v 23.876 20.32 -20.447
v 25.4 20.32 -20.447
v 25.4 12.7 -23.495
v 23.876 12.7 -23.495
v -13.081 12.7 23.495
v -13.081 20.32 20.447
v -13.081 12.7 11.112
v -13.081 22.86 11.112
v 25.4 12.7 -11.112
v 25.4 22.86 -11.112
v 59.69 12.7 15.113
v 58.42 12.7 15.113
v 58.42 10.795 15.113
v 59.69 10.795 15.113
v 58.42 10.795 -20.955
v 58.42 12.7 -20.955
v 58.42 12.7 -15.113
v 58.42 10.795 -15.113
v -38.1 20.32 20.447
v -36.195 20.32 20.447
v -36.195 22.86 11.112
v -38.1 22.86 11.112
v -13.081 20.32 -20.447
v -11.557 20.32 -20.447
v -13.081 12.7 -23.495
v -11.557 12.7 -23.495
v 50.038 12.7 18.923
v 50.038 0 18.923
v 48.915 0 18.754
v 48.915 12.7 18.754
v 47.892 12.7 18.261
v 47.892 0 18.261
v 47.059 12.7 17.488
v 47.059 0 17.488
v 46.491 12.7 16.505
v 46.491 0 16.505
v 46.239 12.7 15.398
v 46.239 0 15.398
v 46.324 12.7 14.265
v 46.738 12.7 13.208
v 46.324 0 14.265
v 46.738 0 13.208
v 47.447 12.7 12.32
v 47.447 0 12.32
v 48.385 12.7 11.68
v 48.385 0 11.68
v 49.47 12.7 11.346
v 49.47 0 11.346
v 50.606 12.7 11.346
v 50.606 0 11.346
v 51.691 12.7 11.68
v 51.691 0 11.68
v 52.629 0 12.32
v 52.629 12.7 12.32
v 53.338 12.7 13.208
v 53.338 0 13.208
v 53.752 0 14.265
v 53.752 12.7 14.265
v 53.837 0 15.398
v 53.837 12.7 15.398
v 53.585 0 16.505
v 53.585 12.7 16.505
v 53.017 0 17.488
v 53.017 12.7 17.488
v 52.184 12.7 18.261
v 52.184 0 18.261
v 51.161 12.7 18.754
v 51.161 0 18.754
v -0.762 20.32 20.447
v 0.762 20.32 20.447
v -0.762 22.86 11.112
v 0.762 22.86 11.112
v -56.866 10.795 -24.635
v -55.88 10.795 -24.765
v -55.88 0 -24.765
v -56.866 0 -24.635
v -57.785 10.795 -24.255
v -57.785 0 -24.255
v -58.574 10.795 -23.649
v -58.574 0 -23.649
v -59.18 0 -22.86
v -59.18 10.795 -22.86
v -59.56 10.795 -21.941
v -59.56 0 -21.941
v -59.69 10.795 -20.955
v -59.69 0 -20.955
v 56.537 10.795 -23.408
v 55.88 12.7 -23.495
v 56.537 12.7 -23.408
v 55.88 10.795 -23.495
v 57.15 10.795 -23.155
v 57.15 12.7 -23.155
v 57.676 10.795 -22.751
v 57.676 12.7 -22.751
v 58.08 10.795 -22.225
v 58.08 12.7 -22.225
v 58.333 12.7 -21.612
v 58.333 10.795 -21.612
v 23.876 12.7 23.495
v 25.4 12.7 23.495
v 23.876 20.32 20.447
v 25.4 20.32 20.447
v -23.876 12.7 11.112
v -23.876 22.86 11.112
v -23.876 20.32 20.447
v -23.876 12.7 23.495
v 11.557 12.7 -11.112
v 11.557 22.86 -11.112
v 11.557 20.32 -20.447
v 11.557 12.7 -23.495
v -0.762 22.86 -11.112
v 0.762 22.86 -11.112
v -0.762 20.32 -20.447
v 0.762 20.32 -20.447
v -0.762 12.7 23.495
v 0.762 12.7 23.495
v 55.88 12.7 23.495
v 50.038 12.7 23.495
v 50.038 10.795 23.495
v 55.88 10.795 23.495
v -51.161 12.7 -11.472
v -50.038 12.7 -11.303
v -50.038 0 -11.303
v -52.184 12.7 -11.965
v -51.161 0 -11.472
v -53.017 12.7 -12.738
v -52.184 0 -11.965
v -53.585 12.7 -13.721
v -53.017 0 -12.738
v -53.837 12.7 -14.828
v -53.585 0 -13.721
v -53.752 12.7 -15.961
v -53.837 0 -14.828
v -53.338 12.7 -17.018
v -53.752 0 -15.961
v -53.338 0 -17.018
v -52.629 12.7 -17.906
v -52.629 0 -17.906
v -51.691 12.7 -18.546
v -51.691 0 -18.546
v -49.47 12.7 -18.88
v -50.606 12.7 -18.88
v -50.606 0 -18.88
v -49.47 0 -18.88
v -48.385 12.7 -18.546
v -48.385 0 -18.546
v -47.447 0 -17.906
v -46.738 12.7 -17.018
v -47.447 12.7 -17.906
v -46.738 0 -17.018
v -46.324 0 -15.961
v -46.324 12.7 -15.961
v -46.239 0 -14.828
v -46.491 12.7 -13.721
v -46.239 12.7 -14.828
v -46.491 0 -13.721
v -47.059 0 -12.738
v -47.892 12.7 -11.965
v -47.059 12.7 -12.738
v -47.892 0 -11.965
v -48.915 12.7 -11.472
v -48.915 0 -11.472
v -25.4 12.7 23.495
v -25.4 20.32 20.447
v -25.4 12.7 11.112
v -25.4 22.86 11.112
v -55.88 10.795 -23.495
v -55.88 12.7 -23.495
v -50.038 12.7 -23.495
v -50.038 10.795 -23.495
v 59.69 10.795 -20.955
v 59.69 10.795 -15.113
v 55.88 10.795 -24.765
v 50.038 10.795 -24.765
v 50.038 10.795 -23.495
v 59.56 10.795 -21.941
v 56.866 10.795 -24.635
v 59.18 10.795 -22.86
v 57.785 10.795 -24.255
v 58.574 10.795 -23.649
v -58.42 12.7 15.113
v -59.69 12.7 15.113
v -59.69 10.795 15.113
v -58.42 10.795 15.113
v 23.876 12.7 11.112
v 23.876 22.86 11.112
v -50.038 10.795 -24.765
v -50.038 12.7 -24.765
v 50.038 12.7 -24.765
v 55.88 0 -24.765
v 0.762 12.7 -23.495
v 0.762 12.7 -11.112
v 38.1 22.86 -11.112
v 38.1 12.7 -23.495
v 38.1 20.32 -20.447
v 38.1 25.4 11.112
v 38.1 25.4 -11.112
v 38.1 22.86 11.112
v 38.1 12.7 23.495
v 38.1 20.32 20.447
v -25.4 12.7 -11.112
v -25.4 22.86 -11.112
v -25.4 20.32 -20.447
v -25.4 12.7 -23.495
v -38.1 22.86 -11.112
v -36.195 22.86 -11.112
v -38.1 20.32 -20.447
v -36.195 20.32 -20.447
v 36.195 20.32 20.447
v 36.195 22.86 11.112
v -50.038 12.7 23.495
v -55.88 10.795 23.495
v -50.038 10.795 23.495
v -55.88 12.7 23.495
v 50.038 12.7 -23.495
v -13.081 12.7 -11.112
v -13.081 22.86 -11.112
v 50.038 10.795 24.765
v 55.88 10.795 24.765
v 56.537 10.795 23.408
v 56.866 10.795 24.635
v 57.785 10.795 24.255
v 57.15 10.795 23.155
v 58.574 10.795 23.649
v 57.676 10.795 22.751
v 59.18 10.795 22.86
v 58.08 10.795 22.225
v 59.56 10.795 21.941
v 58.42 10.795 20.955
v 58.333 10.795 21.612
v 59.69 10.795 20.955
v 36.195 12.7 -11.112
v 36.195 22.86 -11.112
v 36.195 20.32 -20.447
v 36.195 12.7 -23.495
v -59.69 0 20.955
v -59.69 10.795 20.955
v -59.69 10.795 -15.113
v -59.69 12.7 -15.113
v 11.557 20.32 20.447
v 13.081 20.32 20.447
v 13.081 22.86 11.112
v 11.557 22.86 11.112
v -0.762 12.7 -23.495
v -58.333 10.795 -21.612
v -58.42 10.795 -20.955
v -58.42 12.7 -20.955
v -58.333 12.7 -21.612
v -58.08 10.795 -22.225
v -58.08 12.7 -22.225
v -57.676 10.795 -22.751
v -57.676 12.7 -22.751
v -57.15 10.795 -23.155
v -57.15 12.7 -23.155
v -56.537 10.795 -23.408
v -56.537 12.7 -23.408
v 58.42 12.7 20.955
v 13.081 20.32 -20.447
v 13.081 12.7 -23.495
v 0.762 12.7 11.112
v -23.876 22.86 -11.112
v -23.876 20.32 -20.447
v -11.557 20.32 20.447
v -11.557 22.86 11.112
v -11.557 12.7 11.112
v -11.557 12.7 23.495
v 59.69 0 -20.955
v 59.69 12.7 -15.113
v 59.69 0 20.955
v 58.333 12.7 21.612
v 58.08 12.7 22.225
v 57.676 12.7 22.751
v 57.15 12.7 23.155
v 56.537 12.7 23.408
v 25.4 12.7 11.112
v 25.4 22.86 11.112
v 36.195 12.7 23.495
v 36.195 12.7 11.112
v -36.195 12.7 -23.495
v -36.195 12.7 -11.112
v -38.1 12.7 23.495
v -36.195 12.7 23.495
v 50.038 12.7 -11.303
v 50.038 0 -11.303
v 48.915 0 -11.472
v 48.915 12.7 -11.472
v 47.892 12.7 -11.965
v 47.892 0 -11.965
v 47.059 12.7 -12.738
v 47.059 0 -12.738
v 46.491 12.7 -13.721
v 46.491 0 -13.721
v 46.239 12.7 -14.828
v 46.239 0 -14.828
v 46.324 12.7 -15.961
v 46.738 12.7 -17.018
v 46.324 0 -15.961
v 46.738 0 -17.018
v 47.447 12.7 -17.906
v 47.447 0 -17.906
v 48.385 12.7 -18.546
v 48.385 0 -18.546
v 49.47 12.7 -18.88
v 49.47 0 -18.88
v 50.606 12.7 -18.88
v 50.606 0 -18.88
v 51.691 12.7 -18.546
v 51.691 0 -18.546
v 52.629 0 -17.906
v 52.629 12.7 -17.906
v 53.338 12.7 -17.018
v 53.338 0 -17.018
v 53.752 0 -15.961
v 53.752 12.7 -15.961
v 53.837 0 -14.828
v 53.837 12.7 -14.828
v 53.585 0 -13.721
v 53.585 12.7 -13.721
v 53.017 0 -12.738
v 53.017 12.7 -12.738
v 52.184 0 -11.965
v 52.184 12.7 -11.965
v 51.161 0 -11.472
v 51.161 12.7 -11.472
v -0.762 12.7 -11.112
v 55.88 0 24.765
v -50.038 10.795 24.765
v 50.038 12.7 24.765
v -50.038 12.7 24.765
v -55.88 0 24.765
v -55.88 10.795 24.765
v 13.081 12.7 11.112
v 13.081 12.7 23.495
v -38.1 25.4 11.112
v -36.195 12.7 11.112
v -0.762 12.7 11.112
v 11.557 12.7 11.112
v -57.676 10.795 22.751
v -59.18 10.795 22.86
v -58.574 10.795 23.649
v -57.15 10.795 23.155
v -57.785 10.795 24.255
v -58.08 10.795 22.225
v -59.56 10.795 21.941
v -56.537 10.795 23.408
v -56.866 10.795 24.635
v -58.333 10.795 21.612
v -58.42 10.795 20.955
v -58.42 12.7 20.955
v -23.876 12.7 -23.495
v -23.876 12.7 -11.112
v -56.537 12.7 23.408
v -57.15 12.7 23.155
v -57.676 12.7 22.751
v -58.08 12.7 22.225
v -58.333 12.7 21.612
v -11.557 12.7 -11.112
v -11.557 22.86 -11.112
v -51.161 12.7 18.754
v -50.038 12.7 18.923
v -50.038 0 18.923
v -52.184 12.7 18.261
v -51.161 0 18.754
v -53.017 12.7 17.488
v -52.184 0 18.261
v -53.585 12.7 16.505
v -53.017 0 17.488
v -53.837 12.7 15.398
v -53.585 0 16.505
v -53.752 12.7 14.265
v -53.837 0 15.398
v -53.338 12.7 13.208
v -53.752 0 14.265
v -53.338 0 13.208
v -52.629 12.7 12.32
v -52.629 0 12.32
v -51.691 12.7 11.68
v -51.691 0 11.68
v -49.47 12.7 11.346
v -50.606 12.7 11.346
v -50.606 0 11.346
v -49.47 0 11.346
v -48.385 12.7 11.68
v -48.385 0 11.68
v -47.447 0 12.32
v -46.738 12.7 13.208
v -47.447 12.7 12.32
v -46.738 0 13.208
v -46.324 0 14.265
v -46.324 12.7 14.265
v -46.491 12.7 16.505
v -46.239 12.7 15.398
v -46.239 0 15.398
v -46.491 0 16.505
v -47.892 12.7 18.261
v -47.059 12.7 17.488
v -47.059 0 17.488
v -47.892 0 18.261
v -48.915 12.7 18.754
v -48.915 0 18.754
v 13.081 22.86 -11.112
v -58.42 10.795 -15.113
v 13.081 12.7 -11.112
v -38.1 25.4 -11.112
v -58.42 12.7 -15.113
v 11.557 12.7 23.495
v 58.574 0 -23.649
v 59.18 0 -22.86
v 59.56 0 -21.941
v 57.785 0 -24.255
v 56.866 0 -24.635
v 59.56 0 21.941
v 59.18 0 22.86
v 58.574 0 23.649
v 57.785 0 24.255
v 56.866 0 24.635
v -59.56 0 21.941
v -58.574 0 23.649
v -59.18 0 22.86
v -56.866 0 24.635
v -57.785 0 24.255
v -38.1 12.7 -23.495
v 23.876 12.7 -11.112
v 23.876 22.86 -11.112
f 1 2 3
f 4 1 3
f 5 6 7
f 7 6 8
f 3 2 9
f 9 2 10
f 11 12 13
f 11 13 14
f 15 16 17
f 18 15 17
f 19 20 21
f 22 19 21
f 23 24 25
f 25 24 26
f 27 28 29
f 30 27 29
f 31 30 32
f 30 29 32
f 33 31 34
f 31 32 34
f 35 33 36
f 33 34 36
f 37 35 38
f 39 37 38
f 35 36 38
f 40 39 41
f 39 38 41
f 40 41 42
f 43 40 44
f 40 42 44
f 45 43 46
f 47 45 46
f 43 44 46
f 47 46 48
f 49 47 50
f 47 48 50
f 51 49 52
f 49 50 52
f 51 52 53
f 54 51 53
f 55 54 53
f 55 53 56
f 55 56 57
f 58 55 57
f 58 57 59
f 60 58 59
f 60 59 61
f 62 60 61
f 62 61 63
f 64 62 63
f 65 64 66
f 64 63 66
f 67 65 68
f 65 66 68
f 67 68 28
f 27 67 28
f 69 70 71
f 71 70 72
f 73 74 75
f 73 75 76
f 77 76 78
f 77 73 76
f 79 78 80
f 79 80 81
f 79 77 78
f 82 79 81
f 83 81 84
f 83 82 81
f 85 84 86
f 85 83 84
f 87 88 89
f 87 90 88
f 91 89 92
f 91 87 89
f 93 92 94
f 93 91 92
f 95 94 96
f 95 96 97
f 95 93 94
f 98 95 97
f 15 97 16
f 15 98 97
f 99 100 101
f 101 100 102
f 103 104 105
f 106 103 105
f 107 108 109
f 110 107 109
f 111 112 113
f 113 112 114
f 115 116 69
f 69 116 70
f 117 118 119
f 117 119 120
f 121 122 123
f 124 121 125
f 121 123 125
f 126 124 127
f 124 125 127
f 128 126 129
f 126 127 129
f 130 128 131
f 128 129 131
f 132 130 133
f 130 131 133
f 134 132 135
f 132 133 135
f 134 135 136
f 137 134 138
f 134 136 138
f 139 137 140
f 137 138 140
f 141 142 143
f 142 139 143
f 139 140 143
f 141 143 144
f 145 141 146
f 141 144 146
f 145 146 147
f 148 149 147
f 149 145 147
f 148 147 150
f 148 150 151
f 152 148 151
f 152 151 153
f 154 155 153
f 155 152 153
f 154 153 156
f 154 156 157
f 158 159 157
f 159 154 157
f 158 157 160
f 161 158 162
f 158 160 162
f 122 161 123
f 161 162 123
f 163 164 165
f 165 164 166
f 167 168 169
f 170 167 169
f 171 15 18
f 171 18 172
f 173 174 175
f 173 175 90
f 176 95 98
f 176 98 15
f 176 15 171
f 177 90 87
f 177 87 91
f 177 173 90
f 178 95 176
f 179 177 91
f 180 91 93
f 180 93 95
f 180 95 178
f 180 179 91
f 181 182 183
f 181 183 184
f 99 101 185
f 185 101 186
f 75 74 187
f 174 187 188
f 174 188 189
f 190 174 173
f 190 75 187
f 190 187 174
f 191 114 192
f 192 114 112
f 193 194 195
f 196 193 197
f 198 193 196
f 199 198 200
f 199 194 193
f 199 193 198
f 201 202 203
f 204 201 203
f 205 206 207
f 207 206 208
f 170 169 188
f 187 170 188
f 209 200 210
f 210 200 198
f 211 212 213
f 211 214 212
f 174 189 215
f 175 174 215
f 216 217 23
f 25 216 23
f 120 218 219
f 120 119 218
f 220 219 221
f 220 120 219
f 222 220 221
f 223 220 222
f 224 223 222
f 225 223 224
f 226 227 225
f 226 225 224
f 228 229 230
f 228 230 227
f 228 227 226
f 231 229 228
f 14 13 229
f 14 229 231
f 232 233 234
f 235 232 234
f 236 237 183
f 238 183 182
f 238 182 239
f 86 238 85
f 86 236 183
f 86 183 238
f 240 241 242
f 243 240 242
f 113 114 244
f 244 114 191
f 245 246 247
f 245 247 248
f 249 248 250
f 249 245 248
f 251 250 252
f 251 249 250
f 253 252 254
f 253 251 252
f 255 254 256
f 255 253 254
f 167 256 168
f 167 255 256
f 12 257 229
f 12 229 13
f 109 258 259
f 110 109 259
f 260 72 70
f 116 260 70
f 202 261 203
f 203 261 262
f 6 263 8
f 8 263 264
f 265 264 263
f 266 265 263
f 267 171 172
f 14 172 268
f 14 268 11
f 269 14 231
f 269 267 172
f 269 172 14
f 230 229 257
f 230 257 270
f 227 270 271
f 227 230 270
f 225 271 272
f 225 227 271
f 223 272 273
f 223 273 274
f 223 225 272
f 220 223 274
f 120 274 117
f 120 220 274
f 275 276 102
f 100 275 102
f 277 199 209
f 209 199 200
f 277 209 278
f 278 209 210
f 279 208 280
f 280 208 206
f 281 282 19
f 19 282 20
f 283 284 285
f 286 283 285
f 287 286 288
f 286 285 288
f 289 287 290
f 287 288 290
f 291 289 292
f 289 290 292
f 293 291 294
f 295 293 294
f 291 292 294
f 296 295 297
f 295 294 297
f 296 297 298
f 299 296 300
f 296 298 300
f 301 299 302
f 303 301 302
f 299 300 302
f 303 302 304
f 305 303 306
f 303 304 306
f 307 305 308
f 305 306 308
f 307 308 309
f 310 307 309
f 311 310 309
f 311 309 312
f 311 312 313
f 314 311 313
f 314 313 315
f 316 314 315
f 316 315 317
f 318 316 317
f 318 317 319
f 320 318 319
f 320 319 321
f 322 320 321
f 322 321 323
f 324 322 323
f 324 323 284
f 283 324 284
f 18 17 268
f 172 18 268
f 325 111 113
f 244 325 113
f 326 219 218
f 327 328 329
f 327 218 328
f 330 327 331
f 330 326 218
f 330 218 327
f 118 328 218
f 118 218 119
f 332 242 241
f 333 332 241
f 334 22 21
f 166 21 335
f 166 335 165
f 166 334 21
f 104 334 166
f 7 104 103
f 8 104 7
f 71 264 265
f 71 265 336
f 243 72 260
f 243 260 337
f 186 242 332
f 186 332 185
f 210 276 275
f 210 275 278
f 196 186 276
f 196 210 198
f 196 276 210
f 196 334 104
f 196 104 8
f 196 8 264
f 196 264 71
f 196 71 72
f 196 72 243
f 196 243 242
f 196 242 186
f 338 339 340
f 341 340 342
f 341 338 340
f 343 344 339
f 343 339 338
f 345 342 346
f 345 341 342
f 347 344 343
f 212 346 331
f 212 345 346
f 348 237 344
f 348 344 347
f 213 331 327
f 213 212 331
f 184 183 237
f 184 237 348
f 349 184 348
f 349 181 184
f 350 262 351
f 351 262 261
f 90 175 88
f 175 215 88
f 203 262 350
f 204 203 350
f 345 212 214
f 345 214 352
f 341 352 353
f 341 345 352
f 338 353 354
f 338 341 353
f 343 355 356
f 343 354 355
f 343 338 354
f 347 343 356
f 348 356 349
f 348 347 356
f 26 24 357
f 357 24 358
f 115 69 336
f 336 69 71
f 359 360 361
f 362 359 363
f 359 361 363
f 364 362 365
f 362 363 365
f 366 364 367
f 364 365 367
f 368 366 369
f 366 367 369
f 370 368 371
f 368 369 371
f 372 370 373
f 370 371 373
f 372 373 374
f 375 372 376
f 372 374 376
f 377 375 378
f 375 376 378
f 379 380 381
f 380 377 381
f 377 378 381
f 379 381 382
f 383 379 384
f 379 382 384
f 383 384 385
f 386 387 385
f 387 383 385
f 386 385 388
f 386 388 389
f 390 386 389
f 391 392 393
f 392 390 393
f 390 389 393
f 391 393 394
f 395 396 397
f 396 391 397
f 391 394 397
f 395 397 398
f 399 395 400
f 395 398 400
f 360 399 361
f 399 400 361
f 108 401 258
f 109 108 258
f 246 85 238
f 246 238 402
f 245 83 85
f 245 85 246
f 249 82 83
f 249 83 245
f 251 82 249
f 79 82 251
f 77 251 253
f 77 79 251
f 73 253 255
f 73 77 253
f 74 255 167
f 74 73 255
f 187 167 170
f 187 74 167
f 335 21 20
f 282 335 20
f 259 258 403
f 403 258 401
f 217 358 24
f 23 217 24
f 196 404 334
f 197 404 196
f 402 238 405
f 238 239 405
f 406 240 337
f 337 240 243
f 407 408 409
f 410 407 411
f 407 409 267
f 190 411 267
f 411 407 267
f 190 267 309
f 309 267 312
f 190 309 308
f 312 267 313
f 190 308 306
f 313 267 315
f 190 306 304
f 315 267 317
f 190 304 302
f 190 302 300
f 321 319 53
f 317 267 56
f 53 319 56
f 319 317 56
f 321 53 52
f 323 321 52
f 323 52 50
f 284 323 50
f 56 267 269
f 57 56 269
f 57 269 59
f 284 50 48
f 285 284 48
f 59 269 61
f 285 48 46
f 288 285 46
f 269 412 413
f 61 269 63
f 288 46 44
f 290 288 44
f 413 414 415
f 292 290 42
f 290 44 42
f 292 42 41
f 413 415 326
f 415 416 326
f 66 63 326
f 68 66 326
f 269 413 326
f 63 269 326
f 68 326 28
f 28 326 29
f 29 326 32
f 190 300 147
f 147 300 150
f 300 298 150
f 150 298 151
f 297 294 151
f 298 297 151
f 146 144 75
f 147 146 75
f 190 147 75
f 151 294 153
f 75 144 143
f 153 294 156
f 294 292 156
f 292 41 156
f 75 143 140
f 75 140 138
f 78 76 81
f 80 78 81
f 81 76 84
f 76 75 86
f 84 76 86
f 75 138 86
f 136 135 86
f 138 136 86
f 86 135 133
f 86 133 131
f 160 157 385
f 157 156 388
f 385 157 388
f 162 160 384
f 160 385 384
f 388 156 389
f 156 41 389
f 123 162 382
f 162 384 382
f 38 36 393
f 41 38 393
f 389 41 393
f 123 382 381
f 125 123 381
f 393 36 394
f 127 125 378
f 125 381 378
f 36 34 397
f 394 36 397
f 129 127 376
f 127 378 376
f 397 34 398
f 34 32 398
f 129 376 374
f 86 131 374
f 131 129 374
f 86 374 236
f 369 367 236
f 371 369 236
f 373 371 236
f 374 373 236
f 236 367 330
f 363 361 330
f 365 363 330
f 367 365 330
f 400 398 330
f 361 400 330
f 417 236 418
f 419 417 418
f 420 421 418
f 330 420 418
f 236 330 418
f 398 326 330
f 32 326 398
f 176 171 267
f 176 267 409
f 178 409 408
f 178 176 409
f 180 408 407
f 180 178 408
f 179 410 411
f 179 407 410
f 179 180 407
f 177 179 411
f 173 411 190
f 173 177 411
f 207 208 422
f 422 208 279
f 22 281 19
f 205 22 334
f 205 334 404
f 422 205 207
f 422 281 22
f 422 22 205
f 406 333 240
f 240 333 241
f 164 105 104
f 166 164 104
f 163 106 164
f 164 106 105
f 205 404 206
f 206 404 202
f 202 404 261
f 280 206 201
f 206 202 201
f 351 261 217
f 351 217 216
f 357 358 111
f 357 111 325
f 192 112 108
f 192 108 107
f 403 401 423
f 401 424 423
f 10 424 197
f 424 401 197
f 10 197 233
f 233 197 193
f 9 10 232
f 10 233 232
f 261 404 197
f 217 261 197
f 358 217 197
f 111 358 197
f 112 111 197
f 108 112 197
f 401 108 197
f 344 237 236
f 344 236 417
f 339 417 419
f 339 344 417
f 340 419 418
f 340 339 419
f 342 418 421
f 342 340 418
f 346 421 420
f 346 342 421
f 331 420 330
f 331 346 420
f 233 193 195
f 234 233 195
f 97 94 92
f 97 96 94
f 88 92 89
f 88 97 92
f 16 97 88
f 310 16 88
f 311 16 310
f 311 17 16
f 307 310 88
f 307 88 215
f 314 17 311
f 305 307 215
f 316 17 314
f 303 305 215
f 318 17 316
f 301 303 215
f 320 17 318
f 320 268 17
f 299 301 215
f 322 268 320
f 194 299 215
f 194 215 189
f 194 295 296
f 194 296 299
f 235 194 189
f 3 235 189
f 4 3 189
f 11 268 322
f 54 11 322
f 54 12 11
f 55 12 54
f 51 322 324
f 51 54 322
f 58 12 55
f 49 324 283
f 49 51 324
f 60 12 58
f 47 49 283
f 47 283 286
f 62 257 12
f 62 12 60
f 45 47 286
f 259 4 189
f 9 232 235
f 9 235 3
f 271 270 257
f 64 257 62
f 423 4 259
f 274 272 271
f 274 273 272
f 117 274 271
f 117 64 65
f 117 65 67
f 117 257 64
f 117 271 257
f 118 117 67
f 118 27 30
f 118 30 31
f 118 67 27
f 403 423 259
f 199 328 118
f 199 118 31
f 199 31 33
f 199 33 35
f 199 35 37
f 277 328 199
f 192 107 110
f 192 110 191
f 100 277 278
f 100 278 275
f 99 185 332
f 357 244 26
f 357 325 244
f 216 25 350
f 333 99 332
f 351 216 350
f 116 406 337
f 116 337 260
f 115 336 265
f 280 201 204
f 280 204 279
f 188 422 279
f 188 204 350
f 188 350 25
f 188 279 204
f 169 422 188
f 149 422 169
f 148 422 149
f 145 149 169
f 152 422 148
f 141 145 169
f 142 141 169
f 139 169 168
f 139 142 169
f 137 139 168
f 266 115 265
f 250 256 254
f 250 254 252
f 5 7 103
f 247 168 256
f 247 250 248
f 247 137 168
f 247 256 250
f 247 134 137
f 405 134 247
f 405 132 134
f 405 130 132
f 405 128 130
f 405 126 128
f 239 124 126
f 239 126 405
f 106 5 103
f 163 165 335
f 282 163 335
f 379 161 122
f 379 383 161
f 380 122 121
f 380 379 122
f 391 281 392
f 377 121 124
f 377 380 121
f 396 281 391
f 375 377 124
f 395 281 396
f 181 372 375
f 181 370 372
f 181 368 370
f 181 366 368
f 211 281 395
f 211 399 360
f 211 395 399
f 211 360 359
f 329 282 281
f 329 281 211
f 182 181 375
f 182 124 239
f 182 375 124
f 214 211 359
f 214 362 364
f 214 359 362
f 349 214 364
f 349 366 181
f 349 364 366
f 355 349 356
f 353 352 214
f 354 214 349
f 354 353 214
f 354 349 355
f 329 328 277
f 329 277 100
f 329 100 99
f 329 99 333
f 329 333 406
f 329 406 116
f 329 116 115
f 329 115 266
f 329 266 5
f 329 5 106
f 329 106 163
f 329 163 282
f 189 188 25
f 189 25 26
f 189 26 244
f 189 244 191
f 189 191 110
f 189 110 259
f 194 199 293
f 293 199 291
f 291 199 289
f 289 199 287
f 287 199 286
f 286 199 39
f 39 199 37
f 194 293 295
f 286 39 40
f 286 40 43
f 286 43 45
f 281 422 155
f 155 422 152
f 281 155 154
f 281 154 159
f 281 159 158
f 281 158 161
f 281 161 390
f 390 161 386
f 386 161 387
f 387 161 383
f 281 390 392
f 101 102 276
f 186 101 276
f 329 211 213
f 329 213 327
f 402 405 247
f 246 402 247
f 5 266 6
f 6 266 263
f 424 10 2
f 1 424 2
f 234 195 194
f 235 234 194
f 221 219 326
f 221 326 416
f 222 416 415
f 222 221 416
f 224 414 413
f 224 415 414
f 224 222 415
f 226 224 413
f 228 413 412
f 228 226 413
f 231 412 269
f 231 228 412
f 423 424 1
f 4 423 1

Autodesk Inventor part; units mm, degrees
ref_plane "YZ Plane" through (0, 0, 0) normal (1, 0, 0) x (0, 1, 0)
ref_plane "XZ Plane" through (0, 0, 0) normal (0, 1, 0) x (-1, 0, 0)
ref_plane "XY Plane" through (0, 0, 0) normal (0, 0, 1) x (1, 0, 0)
sketch "Sketch1" plane through (0, 0, 0) normal (0, 1, 0) x (-1, 0, 0)
  line L0 (59.69, -24.765) -> (-59.69, -24.765)
  line L1 (-59.69, -24.765) -> (-59.69, 24.765)
  line L2 (-59.69, 24.765) -> (59.69, 24.765)
  line L3 (59.69, 24.765) -> (59.69, -24.765)
  line L4 (59.69, -24.765) -> (-59.69, 24.765) construction
  line L5 (-59.69, -24.765) -> (59.69, 24.765) construction
  point P0 (0, 0)
  dimension "d0" = 119.38
  dimension "d1" = 59.69
  dimension "d2" = 49.53
  dimension "d3" = 24.765
extrude "Extrusion1" add sketch "Sketch1" along normal blind 12.7
sketch "Sketch2" plane through (0, 12.7, 0) normal (0, 1, 0) x (1, 0, 0)
  line L0 (38.1, -23.495) -> (-38.1, -23.495)
  line L1 (-38.1, -23.495) -> (-38.1, 23.495)
  line L2 (-38.1, 23.495) -> (38.1, 23.495)
  line L3 (38.1, 23.495) -> (38.1, -23.495)
  line L4 (59.69, -24.765) -> (59.69, 24.765) projected
  line L5 (-59.69, -24.765) -> (59.69, -24.765) projected
  line L6 (-59.69, 24.765) -> (-59.69, -24.765) projected
  point P0 (0, 0)
  dimension "d6" = 21.59
  dimension "d7" = 76.2
  dimension "d8" = 1.27
  dimension "d9" = 46.99
  dimension "d10" = 21.59
extrude "Extrusion2" add sketch "Sketch2" along normal blind 12.7
sketch "Sketch3" plane through (0, 25.4, 0) normal (0, 1, 0) x (1, 0, 0)
  line L0 (-38.1, 23.495) -> (38.1, 23.495) projected
  line L1 (36.195, 23.495) -> (25.4, 23.495)
  line L2 (25.4, 23.495) -> (25.4, 11.1125)
  line L3 (25.4, 11.1125) -> (36.195, 11.1125)
  line L4 (36.195, 11.1125) -> (36.195, 23.495)
  line L5 (38.1, -23.495) -> (38.1, 23.495) projected
  point P0 (0, 0)
  dimension "d13" = 1.905
  dimension "d14" = 10.795
  dimension "d15" = 11.1125
extrude "Extrusion3" cut sketch "Sketch3" against normal up to surface (12.7 mm away)
pattern_linear "Rectangular Pattern1" count 6 spacing 12.319 along (-1, 0, 0) count 2 spacing -34.6075 along (0, 0, -1) of "Extrusion3"
sketch "Sketch4" plane through (0, 12.7, 0) normal (0, 1, 0) x (1, 0, 0)
  line L0 (-59.69, 24.765) -> (-59.69, -24.765) projected
  line L1 (-59.69, -15.113) -> (-58.42, -15.113)
  line L2 (-58.42, -15.113) -> (-58.42, -23.495)
  line L3 (-58.42, -23.495) -> (-50.038, -23.495)
  line L4 (-50.038, -23.495) -> (-50.038, -24.765)
  line L5 (-50.038, -24.765) -> (-59.69, -24.765)
  line L6 (-59.69, -24.765) -> (-59.69, -15.113)
  line L7 (-59.69, 24.765) -> (-59.69, 15.113)
  line L8 (-59.69, 15.113) -> (-58.42, 15.113)
  line L9 (-58.42, 15.113) -> (-58.42, 23.495)
  line L10 (-58.42, 23.495) -> (-50.038, 23.495)
  line L11 (-50.038, 23.495) -> (-50.038, 24.765)
  line L12 (-50.038, 24.765) -> (-59.69, 24.765)
  point P0 (0, 0)
  dimension "d24" = 1.27
  dimension "d25" = 1.27
  dimension "d26" = 8.382
  dimension "d27" = 1.27
  dimension "d28" = 1.27
extrude "Extrusion4" cut sketch "Sketch4" against normal blind 1.905
mirror "Mirror1" about plane through (0, 0, 0) normal (1, 0, 0) of "Extrusion4"
sketch "Sketch5" plane through (0, 12.7, 0) normal (0, 1, 0) x (1, 0, 0)
  line L0 (-50.038, -24.765) -> (50.038, -24.765) projected
  line L1 (59.69, -15.113) -> (59.69, 15.113) projected
  line L2 (50.038, 24.765) -> (-50.038, 24.765) projected
  point P0 (0, 0)
  point P1 (50.038, -15.113)
  point P2 (50.038, 15.113)
  dimension "d38" = 9.652
  dimension "d39" = 9.652
  dimension "d40" = 9.652
  dimension "d41" = 9.652
hole "Hole1" at (50.038, 12.7, 15.113) at (50.038, 12.7, -15.113) direction (0, -1, 0) diameter 7.62 end through all
mirror "Mirror2" about plane through (0, 0, 0) normal (1, 0, 0) of "Hole1"
fillet "Fillet1" radius 3.81 4 edges at (59.69, 5.3975, -24.765) (59.69, 5.3975, 24.765) (-59.69, 5.3975, 24.765) (-59.69, 5.3975, -24.765)
fillet "Fillet1" radius 2.54 4 edges at (-58.42, 11.7475, -23.495) (-58.42, 11.7475, 23.495) (58.42, 11.7475, -23.495) (58.42, 11.7475, 23.495)
sketch "Sketch6" plane through (38.1, 12.7, 23.495) normal (1, 0, 0) x (0, 0, -1)
  line L0 (0, 0) -> (0, 12.7) projected
  line L1 (0, 0) -> (3.048, 7.62)
  line L2 (46.99, 12.7) -> (0, 12.7) projected
  line L3 (0, 12.7) -> (12.3825, 12.7)
  line L4 (0, 12.7) -> (0, 0)
  line L5 (2.54, 0) -> (8.382, 0) projected
  line L6 (3.048, 7.62) -> (12.3825, 10.16)
  line L7 (12.3825, 10.16) -> (12.3825, 12.7)
  point P0 (23.495, -12.7)
  point P1 (12.3825, 12.7)
  dimension "d44" = 7.62
  dimension "d45" = 12.3825
  dimension "d46" = 2.54
  dimension "d47" = 2.54
  dimension "d49" = 3.048
extrude "Extrusion5" cut sketch "Sketch6" against normal through all
mirror "Mirror3" about plane through (0, 0, 0) normal (0, 0, 1) of "Extrusion5"
properties part number "CO-1-01-12VoltFuse"
